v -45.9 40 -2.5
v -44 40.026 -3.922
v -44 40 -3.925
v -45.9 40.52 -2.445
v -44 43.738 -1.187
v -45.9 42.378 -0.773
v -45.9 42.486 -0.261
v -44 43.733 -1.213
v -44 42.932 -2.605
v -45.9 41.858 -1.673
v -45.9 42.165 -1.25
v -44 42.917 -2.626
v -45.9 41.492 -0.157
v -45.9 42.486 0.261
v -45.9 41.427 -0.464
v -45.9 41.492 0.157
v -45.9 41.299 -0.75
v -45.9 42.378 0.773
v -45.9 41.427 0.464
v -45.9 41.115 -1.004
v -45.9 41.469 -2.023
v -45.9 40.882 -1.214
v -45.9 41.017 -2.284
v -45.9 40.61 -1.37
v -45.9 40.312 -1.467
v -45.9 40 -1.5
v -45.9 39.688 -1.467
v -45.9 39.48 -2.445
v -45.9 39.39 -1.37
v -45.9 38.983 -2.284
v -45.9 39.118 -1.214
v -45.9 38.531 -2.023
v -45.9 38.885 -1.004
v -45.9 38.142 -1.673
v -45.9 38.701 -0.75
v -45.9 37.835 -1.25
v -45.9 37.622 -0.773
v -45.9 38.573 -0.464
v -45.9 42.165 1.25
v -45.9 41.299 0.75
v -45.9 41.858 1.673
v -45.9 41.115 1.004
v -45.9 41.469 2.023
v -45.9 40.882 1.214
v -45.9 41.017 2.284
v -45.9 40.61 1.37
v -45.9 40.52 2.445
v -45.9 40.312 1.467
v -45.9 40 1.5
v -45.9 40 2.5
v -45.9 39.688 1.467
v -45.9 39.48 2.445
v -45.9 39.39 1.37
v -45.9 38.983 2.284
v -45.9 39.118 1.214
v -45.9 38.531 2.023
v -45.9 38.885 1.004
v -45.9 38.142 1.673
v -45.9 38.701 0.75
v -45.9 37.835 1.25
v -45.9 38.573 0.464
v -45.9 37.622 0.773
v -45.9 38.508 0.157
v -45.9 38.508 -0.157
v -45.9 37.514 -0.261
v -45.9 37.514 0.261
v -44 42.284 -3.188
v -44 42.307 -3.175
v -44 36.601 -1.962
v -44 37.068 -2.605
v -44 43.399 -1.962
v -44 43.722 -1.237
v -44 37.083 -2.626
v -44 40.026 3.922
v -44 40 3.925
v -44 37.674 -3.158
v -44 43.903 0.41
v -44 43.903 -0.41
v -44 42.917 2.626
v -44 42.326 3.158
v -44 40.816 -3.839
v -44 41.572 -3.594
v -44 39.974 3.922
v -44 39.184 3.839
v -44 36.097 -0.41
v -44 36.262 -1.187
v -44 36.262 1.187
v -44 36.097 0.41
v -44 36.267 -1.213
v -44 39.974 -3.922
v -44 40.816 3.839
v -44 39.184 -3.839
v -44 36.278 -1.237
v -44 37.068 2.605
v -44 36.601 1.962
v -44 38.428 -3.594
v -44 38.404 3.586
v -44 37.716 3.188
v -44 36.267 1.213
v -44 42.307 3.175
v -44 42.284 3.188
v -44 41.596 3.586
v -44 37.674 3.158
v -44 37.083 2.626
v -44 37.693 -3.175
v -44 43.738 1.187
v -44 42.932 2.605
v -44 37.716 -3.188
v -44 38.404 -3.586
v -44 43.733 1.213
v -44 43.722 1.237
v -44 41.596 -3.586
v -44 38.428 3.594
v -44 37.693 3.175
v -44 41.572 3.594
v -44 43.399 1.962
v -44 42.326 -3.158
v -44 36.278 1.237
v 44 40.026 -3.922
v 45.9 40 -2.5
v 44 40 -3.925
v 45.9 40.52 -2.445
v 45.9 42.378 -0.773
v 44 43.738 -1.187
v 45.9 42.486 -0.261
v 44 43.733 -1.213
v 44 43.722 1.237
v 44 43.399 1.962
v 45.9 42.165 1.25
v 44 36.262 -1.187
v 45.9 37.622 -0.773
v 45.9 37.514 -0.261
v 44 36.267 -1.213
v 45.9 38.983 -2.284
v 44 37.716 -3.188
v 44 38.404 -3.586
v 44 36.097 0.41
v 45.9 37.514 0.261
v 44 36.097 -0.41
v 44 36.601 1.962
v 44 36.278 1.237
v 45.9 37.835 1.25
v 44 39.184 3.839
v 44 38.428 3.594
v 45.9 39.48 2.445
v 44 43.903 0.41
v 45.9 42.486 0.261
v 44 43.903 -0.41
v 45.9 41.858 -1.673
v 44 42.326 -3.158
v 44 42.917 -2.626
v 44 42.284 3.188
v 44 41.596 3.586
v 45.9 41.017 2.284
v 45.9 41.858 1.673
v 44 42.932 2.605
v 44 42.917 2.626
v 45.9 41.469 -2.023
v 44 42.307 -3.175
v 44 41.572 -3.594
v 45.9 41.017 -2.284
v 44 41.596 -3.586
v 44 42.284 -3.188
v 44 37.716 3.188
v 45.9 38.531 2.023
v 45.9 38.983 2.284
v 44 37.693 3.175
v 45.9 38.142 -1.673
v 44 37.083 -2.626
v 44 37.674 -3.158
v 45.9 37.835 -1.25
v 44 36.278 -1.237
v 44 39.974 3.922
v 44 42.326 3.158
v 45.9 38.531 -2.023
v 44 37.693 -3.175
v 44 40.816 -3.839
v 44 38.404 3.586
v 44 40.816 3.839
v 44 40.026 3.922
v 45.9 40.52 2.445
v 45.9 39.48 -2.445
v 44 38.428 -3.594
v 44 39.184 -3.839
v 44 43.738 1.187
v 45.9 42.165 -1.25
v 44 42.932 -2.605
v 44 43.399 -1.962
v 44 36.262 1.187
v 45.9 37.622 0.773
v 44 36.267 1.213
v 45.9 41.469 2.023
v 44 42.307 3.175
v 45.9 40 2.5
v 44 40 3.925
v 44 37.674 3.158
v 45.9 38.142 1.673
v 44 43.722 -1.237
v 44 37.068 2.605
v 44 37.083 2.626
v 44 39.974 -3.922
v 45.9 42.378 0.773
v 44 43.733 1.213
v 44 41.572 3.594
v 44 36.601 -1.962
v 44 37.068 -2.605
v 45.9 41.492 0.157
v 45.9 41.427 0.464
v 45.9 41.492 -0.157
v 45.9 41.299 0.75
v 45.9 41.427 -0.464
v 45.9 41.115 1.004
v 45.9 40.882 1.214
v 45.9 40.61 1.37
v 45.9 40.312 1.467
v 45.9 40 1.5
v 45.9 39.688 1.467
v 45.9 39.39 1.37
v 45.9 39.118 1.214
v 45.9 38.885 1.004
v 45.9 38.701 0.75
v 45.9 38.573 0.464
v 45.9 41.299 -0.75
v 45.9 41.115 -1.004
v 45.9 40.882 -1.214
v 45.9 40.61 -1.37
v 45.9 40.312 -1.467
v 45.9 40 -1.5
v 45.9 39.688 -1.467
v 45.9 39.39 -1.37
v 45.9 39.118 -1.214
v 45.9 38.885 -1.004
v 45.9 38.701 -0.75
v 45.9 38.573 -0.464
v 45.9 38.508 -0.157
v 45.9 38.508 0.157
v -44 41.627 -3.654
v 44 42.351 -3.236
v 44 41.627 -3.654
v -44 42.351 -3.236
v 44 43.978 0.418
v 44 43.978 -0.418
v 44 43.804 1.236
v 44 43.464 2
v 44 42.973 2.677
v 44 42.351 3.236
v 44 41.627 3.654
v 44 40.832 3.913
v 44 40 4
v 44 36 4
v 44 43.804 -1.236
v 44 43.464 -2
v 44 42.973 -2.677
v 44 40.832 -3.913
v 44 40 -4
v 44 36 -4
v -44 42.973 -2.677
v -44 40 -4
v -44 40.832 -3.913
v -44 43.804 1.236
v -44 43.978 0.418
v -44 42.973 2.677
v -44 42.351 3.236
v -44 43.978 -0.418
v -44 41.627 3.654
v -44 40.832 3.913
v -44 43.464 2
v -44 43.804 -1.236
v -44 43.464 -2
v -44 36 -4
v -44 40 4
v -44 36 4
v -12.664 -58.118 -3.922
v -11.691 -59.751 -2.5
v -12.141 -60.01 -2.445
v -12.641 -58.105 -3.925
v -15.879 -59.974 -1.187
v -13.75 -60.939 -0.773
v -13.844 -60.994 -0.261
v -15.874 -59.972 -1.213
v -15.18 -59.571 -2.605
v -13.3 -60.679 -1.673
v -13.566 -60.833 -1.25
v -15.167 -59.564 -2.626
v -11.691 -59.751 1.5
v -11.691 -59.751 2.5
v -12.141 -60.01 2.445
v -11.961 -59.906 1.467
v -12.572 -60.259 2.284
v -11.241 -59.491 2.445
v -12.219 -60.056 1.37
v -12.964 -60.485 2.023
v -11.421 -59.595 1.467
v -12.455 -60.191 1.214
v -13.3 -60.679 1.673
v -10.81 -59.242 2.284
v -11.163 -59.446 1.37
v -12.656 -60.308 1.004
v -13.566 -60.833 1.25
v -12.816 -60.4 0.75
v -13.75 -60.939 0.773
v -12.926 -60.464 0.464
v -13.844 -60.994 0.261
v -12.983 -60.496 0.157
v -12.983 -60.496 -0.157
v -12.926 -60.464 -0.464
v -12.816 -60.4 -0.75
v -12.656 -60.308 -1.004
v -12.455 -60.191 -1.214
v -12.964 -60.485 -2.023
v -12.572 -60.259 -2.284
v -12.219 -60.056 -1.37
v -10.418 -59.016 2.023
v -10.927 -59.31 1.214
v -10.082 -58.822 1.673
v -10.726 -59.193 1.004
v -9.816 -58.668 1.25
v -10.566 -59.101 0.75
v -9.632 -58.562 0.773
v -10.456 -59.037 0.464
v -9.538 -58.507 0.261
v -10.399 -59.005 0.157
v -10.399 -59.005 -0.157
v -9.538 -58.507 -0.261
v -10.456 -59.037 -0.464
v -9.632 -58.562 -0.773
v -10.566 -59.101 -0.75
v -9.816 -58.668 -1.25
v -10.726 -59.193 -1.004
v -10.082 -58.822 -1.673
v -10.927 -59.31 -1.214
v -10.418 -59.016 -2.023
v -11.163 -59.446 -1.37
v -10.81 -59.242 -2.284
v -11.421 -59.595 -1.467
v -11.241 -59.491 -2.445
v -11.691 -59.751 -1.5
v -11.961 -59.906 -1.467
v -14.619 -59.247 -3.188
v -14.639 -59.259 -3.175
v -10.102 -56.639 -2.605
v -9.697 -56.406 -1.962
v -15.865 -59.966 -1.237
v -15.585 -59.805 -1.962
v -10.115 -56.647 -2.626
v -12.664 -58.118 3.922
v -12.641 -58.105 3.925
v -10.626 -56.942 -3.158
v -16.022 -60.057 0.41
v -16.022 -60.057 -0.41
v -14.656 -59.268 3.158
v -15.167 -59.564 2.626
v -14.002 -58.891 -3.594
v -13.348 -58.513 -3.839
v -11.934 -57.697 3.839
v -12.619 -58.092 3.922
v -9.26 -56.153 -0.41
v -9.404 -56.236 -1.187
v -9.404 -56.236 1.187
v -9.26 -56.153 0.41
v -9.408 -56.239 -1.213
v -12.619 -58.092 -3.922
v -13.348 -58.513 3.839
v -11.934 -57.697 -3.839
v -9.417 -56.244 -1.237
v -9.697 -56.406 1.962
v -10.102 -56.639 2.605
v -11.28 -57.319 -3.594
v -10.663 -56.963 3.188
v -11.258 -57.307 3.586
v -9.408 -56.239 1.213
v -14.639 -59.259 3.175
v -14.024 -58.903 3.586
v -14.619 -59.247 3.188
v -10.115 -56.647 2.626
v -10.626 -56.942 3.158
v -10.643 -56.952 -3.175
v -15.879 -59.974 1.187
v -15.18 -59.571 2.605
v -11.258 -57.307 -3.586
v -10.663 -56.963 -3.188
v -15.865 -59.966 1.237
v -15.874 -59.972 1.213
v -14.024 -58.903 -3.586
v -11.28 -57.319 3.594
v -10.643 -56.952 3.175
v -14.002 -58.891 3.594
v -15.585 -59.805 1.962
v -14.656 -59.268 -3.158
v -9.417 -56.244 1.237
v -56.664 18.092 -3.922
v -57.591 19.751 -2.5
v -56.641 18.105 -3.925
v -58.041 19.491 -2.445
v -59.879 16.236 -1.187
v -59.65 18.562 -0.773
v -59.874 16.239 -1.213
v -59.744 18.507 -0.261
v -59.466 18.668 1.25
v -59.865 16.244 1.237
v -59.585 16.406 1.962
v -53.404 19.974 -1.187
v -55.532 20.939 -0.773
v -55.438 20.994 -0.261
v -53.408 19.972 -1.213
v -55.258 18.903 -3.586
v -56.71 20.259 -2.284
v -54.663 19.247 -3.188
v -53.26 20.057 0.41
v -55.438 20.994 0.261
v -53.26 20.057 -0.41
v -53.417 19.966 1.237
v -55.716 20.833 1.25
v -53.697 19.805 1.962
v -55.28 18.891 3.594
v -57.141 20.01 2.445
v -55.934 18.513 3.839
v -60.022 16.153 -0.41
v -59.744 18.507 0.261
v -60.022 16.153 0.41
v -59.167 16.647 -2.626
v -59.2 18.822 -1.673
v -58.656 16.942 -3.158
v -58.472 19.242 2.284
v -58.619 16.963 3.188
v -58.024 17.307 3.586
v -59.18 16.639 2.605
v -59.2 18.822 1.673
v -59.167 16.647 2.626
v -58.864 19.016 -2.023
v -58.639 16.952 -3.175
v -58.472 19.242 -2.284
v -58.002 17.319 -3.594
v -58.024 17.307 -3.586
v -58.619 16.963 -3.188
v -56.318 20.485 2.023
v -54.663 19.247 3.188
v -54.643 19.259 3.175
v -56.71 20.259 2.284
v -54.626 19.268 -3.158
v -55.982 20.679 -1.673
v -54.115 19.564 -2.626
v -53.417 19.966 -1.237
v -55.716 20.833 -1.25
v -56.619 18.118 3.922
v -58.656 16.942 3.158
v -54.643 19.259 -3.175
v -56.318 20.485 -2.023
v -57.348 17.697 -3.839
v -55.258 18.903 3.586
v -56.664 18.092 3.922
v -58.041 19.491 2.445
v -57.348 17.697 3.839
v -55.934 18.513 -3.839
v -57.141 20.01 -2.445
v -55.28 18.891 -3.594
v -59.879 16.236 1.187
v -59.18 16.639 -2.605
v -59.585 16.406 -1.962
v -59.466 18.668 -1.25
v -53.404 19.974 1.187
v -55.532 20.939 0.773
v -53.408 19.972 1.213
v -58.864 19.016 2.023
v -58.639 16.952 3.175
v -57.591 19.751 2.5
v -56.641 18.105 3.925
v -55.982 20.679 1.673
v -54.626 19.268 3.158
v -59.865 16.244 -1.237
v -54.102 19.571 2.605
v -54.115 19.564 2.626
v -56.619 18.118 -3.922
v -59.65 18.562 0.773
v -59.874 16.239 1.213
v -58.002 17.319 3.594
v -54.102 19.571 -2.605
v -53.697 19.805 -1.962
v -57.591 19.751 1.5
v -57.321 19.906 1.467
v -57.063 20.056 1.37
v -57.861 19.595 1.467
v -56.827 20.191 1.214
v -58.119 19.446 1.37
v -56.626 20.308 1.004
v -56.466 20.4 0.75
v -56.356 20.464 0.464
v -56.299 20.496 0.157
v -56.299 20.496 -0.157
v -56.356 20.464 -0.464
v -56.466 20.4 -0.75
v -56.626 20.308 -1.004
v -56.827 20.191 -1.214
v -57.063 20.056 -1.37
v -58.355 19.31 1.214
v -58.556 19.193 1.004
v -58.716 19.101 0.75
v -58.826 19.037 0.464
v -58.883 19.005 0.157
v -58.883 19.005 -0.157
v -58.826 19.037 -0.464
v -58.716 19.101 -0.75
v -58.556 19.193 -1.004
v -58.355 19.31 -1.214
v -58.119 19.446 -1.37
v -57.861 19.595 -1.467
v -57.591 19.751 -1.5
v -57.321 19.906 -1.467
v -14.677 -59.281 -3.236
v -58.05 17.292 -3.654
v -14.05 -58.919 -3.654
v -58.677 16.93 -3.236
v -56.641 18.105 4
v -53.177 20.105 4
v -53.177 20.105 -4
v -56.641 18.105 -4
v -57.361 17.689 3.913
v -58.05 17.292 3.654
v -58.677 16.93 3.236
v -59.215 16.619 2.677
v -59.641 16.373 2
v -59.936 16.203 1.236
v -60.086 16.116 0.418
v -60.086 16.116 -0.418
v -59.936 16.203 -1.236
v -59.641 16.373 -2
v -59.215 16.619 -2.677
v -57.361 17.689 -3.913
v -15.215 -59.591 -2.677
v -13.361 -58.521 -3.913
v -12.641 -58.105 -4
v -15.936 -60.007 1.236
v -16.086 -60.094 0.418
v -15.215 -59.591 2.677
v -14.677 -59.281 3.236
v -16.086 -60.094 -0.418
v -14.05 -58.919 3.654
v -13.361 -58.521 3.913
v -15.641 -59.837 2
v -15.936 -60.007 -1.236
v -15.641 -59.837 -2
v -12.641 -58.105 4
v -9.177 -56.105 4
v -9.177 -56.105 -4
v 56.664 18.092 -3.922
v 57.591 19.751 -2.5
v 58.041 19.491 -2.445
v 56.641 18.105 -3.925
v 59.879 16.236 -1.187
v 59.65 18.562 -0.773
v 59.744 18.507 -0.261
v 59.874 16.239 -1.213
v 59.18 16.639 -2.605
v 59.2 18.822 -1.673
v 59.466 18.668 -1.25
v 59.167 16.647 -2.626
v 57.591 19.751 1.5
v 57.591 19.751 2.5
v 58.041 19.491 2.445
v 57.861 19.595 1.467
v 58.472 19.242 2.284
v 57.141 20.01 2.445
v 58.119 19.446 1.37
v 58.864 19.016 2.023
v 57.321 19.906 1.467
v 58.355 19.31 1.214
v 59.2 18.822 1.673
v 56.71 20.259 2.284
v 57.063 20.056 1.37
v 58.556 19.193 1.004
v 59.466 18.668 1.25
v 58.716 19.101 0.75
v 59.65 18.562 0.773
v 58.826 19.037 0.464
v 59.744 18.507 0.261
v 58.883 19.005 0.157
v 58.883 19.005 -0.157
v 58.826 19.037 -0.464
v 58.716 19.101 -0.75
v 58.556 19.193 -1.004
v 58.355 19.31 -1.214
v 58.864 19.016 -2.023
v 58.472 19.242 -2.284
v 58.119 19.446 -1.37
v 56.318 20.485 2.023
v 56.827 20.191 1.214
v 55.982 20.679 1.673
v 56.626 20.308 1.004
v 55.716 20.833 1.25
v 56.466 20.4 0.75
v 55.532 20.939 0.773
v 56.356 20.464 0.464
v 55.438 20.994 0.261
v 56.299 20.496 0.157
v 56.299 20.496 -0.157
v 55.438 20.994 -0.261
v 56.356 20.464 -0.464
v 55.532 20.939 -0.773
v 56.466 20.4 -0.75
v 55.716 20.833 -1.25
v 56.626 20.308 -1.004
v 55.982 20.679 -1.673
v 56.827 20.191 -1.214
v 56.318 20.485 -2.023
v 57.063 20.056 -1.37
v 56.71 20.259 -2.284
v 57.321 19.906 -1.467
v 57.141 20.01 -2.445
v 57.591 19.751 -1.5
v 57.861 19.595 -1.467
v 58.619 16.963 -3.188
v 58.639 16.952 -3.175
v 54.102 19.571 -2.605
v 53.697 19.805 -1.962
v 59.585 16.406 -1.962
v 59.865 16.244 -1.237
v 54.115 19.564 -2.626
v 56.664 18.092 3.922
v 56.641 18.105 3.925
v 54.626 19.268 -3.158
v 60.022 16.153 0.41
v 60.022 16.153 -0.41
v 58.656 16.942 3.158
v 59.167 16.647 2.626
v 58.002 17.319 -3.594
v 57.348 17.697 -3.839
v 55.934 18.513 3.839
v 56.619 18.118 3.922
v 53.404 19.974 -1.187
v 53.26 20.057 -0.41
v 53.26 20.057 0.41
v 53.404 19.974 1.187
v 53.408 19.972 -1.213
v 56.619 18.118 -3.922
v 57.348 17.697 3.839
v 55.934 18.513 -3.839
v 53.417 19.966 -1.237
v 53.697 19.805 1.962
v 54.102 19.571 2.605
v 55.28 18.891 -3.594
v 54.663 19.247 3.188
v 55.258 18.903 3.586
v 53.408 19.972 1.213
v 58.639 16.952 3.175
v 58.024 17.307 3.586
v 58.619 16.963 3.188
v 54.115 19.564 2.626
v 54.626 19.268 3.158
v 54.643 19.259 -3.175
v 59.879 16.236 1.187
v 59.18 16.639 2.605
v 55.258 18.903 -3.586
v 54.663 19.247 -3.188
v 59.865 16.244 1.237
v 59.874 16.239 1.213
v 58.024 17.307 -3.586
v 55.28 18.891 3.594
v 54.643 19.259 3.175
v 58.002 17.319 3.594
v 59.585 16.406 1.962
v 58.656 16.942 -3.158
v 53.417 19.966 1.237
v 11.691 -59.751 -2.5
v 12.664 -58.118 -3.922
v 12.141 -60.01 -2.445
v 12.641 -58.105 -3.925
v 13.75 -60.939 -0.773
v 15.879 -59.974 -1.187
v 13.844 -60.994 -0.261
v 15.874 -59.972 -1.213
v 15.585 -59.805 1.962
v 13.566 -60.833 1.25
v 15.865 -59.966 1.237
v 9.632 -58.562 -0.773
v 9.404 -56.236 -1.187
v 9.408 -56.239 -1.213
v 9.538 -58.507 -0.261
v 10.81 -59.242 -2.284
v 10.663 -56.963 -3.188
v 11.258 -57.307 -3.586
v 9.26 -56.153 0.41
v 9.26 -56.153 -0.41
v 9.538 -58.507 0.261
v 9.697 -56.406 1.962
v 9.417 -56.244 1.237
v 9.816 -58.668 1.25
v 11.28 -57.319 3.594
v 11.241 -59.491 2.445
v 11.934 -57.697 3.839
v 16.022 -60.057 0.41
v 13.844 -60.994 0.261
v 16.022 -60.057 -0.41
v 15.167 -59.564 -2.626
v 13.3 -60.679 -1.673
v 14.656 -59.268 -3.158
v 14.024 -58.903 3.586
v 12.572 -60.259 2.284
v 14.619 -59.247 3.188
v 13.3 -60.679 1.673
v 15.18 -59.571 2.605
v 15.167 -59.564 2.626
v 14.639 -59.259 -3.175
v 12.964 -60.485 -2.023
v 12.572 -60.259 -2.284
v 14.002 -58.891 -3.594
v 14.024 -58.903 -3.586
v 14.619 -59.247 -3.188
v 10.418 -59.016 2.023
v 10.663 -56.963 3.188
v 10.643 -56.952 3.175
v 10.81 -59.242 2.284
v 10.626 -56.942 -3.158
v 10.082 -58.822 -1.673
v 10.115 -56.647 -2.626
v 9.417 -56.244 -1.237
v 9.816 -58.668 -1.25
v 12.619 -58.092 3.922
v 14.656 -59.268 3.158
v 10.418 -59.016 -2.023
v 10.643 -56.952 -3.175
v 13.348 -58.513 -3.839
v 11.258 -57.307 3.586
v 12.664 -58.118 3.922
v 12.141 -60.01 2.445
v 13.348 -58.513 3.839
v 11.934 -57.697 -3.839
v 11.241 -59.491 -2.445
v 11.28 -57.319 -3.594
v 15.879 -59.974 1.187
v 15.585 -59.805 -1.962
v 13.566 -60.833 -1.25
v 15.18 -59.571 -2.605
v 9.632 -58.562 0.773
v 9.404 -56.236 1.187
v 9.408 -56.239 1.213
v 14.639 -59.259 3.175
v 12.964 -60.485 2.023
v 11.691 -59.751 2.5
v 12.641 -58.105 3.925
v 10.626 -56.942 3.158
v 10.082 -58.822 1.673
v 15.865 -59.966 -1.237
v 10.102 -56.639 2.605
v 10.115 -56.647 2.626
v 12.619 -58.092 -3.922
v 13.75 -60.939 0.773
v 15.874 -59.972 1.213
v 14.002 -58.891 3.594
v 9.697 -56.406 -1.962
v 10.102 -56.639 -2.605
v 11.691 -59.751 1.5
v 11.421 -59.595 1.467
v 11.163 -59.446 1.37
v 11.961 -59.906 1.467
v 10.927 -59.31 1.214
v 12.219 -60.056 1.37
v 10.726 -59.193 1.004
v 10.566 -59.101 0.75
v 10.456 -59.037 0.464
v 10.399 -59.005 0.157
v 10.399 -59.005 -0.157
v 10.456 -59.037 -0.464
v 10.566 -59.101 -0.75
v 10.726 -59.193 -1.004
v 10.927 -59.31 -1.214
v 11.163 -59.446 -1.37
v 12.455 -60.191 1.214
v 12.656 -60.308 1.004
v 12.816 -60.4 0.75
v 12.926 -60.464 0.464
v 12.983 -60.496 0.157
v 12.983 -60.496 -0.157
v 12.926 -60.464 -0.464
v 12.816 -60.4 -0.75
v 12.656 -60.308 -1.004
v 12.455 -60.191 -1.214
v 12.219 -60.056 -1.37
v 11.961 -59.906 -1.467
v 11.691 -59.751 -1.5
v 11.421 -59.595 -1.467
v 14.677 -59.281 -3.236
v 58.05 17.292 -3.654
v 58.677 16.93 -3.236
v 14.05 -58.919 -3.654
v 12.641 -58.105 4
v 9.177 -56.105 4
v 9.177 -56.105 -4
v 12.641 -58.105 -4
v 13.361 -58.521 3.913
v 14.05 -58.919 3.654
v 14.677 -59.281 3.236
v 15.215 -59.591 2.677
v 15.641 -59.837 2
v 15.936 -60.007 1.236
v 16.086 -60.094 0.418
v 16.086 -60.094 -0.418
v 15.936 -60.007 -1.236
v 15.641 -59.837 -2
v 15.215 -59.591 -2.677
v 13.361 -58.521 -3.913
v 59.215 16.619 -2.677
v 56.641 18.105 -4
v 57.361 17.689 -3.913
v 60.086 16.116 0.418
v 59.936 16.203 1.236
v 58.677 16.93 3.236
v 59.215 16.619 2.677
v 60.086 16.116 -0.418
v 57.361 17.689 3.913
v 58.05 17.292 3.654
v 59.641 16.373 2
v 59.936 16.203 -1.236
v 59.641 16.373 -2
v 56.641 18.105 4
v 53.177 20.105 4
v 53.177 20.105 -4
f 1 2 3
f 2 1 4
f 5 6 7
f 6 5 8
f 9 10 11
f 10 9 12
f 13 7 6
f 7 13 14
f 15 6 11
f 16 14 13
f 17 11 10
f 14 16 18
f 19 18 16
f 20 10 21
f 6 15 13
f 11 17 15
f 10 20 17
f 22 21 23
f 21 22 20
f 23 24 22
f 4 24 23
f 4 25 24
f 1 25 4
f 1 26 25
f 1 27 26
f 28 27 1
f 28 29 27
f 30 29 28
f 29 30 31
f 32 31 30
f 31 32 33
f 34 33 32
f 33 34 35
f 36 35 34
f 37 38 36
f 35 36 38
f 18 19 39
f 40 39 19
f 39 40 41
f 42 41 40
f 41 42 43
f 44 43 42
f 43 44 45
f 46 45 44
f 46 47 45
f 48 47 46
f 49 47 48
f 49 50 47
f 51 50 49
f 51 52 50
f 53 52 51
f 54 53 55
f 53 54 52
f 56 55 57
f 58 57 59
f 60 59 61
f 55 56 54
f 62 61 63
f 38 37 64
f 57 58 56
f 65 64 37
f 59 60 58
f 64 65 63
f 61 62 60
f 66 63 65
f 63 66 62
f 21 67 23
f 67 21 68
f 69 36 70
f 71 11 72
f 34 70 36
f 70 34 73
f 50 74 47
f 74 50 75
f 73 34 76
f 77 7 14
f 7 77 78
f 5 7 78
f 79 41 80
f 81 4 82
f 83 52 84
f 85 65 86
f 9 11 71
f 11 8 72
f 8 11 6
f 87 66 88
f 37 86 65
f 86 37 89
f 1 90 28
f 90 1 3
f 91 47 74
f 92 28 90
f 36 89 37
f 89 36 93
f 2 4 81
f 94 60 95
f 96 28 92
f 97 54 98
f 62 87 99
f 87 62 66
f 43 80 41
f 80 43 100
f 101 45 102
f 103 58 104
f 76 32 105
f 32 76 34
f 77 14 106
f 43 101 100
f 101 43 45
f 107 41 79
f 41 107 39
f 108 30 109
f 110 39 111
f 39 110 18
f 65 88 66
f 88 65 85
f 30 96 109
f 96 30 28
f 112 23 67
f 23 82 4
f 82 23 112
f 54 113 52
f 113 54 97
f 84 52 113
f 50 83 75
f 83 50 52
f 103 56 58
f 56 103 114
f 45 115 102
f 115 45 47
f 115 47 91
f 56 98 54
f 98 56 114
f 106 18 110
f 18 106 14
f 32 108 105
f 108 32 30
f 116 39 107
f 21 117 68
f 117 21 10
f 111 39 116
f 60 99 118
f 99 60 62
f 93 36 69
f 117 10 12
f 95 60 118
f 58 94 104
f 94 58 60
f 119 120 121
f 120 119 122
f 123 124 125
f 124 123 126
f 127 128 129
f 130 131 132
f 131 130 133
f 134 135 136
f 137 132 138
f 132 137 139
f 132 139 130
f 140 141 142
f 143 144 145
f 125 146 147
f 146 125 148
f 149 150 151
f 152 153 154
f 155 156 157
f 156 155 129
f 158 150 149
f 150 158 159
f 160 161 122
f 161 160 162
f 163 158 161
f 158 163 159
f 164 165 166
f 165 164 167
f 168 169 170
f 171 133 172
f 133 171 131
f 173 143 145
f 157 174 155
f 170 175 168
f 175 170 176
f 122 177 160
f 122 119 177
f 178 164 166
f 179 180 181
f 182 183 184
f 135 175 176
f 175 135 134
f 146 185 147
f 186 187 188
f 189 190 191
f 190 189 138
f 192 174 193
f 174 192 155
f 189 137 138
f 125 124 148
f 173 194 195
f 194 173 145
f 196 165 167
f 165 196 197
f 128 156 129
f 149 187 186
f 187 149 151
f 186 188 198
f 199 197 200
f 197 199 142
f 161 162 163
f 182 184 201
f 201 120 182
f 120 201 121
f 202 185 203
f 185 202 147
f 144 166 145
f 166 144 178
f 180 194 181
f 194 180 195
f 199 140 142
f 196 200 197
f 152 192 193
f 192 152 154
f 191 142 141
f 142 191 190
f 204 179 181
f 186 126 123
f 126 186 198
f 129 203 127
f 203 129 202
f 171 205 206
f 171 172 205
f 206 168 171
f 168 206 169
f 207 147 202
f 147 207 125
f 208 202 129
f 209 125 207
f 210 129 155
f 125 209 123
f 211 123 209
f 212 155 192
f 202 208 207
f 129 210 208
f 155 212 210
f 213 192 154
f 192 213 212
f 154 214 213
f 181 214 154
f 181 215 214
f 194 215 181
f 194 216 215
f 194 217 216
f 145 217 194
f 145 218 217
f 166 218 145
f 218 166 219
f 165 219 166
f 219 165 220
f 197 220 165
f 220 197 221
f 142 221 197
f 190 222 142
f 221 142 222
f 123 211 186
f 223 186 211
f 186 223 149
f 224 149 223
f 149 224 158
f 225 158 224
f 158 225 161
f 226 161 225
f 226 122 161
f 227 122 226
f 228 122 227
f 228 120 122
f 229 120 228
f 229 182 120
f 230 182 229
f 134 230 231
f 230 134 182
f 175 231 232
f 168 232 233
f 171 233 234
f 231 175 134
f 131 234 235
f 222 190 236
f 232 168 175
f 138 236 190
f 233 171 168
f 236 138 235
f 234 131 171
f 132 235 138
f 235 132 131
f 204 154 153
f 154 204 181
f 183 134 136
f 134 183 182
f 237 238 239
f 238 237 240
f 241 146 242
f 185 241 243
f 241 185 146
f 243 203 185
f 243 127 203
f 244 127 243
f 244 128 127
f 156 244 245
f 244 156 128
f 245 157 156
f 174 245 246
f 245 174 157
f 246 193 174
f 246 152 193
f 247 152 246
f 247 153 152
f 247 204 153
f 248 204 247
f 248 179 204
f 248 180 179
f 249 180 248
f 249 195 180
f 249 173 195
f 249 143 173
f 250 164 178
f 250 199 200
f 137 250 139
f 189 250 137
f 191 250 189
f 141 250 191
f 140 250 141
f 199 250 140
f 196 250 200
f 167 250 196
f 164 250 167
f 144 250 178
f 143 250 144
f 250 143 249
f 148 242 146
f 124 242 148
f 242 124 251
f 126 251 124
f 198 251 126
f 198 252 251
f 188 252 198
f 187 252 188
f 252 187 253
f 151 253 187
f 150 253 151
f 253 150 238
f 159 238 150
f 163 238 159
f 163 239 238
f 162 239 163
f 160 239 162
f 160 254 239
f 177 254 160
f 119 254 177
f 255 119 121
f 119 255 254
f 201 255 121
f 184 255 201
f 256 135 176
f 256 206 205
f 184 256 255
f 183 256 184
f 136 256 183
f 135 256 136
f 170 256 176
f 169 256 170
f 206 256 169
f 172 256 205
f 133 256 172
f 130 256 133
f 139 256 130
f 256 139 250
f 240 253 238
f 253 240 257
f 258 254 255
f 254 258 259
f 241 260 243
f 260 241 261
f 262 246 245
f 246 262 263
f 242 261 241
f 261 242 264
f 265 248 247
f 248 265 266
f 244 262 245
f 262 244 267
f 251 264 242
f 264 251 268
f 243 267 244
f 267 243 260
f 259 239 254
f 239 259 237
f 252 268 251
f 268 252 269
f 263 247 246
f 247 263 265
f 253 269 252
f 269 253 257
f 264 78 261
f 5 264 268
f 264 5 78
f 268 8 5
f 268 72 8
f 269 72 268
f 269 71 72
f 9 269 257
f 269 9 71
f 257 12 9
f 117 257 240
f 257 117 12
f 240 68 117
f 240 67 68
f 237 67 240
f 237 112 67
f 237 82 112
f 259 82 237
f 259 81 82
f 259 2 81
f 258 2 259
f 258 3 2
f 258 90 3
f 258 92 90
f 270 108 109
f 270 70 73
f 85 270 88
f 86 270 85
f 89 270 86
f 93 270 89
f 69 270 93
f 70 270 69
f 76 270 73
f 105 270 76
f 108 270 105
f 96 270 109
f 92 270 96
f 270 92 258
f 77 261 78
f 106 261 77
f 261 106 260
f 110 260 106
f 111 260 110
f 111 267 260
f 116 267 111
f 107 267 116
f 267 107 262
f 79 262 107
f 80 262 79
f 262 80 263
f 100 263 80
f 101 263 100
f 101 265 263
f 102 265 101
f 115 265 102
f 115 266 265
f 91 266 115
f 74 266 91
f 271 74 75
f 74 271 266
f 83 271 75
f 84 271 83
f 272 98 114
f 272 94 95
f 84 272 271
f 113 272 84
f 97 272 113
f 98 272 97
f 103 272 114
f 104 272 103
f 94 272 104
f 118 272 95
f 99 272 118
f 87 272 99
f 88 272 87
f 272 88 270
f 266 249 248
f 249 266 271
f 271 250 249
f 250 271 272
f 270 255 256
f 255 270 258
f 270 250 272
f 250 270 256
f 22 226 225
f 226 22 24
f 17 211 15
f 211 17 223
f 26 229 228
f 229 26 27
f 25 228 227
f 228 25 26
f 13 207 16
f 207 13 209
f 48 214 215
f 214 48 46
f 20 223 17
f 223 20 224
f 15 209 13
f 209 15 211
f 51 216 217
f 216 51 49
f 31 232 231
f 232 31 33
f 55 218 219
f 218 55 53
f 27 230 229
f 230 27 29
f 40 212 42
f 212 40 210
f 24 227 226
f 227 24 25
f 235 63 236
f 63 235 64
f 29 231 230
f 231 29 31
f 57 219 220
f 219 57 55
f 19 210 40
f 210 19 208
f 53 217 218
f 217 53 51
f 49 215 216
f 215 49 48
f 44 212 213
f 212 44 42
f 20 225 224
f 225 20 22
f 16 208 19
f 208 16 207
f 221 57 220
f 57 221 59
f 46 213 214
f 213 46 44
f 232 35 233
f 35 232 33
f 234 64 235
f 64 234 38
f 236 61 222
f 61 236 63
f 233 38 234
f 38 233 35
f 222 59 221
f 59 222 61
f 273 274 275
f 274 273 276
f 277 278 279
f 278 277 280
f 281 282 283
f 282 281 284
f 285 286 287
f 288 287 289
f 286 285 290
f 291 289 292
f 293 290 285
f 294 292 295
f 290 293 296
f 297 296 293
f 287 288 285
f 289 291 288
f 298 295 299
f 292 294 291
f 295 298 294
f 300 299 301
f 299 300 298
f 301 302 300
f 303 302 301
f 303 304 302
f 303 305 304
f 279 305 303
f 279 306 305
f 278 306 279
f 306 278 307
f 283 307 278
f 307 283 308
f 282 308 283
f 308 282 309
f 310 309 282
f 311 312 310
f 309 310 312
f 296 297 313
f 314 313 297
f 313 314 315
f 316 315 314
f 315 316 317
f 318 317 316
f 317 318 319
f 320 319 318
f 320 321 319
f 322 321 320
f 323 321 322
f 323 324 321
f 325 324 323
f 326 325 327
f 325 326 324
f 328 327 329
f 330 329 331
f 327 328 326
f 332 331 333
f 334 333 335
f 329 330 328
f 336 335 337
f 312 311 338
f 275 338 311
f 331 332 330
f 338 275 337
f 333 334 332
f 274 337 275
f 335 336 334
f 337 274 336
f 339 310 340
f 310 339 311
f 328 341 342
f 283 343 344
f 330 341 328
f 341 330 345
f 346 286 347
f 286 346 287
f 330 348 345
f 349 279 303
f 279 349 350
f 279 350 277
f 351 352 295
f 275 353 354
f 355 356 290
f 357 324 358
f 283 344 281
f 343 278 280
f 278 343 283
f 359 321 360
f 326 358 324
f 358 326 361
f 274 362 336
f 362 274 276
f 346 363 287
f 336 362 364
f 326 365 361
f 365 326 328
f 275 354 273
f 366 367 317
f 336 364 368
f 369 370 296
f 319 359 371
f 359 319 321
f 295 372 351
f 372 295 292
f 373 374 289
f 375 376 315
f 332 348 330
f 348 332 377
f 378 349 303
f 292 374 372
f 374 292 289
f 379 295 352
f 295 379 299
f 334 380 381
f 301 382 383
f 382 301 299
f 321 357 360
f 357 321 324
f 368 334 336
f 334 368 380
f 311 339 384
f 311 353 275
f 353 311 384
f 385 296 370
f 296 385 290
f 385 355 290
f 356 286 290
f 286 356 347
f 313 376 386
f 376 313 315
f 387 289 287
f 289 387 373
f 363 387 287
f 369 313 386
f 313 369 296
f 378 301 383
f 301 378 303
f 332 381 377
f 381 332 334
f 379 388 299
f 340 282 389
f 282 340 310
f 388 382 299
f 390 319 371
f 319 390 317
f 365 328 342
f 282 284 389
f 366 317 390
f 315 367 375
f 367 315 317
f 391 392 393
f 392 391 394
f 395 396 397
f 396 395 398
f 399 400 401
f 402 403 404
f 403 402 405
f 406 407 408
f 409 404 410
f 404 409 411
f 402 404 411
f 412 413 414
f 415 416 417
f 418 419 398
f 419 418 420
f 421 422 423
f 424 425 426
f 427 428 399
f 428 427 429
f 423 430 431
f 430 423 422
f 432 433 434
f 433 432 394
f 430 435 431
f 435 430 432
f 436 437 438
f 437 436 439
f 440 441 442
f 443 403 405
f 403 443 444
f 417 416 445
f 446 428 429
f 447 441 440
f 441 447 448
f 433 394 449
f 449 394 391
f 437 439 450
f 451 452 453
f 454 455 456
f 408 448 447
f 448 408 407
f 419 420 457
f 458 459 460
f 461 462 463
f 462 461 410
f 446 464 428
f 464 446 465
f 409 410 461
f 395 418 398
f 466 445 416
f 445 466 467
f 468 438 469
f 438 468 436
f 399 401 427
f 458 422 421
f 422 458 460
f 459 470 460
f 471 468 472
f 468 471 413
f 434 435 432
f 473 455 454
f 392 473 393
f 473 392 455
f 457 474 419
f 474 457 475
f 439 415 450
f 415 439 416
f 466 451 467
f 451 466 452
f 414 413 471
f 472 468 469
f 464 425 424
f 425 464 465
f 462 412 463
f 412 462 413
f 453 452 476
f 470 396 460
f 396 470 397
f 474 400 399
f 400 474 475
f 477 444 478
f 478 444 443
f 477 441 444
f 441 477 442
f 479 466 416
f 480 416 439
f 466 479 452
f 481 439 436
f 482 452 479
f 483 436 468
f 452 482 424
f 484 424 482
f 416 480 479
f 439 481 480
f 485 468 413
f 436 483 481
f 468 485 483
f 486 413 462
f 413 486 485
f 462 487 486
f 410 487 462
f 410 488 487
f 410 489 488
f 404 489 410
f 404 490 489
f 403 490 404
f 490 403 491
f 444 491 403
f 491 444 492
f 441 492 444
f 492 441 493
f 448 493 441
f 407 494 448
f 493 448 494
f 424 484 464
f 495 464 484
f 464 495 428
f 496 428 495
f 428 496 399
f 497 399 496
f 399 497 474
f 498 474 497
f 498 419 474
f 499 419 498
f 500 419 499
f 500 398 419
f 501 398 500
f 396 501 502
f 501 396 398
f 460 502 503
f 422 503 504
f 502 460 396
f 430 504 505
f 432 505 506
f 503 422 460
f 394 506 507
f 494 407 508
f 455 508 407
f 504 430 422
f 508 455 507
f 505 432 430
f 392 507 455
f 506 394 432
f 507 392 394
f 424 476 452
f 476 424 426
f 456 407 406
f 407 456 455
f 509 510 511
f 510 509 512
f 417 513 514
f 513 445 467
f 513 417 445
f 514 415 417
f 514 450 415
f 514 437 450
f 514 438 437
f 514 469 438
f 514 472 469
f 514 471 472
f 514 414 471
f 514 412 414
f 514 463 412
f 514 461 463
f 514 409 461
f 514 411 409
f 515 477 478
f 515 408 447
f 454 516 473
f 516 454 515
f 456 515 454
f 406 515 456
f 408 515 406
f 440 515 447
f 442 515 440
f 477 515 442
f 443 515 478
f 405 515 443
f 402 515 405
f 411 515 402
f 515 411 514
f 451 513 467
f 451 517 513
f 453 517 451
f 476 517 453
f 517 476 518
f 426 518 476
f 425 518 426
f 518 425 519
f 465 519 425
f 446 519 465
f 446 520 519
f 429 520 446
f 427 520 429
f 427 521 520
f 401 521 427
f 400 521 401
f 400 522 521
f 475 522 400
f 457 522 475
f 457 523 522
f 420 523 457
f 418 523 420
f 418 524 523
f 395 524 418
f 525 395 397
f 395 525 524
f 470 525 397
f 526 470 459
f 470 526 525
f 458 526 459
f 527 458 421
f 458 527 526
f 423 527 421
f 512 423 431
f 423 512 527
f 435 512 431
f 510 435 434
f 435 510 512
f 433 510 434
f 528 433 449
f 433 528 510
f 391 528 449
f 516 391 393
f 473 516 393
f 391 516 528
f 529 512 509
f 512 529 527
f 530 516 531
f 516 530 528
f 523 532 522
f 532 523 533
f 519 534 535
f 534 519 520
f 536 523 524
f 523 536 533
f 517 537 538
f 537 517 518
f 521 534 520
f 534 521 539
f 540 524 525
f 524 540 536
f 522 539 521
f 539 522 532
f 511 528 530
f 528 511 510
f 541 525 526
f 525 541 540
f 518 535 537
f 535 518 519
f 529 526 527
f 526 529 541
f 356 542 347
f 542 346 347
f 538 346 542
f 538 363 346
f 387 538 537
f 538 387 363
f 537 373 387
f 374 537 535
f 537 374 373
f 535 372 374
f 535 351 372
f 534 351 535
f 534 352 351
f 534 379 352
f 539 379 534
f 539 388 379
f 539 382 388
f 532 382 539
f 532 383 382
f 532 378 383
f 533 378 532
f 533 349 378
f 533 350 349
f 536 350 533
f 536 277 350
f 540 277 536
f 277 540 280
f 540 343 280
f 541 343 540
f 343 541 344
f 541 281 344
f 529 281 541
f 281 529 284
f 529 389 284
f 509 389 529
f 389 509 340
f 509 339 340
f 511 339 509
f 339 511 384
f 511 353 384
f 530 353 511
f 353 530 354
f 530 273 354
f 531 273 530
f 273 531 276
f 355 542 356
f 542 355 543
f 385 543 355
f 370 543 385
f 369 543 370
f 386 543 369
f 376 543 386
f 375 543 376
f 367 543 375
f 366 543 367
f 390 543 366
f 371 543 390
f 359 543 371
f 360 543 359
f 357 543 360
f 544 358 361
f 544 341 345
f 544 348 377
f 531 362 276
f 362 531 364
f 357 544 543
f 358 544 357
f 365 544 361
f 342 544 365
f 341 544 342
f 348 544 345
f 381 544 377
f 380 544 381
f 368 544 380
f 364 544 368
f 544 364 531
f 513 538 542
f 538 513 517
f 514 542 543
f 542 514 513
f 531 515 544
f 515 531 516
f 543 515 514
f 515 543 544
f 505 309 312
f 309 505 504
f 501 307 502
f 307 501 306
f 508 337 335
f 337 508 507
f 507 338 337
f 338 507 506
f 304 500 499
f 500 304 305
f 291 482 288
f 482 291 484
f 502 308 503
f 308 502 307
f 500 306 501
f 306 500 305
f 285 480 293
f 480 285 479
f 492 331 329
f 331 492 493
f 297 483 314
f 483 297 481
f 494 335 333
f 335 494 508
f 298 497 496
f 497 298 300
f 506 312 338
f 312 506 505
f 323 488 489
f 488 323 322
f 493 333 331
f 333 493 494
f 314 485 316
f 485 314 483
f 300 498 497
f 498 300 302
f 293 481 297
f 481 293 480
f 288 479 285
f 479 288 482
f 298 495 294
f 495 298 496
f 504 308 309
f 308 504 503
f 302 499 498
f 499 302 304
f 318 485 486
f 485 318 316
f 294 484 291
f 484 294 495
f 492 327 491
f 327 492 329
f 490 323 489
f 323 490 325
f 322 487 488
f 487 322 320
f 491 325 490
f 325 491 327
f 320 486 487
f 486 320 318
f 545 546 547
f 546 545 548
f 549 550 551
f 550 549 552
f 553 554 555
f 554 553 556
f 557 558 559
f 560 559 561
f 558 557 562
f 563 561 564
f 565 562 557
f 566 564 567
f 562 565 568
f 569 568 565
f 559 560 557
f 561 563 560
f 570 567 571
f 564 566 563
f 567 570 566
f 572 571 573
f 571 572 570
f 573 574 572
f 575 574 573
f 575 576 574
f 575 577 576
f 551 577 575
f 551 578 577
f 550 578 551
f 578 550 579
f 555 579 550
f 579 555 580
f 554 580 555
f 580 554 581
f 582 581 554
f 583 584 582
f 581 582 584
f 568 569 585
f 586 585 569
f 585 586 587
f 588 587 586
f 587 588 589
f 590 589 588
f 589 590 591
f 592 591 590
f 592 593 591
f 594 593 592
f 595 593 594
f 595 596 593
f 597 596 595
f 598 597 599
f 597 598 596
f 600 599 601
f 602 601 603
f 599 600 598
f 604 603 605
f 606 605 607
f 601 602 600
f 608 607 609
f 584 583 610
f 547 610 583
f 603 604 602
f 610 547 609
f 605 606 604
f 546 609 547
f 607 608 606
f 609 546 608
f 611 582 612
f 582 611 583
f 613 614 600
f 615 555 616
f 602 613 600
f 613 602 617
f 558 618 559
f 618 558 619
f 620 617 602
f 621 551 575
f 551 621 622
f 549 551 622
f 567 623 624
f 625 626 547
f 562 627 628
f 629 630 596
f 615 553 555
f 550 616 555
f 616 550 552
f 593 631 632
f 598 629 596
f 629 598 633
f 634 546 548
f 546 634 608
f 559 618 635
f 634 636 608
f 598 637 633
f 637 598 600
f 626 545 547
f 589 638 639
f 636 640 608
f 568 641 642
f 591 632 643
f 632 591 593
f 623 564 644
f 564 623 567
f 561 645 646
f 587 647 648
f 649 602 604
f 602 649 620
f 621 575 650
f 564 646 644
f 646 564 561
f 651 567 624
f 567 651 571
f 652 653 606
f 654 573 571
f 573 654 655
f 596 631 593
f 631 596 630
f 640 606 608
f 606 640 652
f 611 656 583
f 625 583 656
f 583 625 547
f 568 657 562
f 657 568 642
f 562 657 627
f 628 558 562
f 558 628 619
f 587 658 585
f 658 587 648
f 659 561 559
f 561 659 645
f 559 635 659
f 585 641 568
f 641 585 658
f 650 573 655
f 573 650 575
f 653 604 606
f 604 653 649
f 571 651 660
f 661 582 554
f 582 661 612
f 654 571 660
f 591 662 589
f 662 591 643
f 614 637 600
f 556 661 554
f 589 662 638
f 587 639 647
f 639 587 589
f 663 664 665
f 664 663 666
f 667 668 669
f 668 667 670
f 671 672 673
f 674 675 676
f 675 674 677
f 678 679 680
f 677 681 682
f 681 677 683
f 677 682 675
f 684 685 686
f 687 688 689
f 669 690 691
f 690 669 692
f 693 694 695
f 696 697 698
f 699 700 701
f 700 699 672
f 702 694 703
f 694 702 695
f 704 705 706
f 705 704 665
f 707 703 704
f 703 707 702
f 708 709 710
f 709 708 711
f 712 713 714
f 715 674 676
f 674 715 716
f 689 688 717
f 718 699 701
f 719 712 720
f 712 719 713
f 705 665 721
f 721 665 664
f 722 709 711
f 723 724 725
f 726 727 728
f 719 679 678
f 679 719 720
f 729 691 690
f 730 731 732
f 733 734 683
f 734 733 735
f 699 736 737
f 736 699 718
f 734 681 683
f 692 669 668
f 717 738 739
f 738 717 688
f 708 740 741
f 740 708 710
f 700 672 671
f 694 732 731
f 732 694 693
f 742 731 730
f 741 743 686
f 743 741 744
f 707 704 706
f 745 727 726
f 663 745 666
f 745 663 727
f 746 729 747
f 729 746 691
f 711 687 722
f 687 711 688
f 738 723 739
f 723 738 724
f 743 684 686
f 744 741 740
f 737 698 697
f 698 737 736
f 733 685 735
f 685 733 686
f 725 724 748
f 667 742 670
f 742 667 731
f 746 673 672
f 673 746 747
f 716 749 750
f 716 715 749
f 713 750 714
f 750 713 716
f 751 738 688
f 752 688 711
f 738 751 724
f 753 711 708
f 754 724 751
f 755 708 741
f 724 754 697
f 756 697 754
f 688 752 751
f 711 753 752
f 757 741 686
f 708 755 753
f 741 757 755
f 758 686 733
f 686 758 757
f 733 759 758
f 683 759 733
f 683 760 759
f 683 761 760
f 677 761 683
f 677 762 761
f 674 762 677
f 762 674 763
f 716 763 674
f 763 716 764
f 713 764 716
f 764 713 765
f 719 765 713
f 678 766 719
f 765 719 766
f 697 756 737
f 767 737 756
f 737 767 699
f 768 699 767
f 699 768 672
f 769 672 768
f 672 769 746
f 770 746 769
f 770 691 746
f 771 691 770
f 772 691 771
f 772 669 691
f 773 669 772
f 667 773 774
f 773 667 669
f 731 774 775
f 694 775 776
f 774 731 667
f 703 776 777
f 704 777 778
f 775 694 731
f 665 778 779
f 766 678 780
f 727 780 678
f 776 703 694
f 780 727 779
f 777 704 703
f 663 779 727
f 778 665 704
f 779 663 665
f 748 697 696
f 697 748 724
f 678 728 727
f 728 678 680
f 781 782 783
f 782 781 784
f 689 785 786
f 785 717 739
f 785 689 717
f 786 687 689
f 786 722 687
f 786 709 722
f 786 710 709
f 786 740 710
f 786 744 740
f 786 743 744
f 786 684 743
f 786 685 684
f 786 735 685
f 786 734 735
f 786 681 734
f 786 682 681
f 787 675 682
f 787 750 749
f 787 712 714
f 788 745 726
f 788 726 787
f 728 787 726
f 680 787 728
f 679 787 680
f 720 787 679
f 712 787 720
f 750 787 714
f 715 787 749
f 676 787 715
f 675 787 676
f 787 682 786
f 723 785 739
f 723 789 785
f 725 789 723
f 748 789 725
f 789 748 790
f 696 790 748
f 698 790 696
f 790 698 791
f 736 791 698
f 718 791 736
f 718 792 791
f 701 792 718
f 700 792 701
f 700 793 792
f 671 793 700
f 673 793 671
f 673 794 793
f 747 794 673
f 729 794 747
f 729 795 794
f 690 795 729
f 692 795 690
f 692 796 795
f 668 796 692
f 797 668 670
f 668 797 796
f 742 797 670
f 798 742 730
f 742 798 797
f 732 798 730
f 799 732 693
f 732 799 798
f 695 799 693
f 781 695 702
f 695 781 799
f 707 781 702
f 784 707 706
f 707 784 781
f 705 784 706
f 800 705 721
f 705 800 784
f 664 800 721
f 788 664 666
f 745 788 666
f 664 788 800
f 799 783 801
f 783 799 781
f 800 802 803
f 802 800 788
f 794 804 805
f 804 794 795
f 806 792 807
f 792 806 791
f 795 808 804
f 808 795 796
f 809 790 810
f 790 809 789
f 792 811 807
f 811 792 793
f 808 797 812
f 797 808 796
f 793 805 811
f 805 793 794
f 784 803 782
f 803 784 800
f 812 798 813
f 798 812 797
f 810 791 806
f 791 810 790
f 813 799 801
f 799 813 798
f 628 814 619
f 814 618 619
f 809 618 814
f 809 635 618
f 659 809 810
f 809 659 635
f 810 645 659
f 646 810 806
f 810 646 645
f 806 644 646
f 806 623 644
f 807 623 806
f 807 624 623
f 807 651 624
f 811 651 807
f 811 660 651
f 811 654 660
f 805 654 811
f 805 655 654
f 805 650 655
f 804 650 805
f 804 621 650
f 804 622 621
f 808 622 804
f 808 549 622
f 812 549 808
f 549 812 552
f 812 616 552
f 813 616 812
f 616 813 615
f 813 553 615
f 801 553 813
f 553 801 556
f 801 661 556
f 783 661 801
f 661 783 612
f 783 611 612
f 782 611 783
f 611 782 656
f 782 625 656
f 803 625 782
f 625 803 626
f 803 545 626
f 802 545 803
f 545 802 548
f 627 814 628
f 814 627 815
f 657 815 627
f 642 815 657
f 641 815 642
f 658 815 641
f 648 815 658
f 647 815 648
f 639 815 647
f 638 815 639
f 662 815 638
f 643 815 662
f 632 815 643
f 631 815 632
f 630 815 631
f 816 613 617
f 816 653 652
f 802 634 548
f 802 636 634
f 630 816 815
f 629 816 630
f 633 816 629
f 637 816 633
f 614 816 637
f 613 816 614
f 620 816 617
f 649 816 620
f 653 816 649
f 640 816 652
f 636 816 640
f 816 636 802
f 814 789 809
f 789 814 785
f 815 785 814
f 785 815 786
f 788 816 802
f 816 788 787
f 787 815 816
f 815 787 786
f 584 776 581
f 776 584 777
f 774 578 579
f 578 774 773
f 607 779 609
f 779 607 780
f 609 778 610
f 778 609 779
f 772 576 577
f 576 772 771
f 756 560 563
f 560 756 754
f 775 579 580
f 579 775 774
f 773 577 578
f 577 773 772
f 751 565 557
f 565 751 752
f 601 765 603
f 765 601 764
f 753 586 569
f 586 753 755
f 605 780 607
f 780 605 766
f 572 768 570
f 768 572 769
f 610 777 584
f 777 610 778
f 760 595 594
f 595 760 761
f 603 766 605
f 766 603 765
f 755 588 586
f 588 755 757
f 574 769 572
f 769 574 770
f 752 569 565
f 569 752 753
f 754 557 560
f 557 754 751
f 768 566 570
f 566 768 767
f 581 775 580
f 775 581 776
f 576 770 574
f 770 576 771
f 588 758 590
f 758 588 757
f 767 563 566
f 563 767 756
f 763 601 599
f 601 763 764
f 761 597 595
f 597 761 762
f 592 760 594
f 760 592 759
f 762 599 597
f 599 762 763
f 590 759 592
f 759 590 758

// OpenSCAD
// file: ujoint.scad
use <MCAD/metric_fastners.scad>;

bearing_height=2.5;
bearing_od=6;
bearing_id=3;

//bearing_height=4;
//bearing_od=10;
bearing_id=3;


module mr63zz() {
    $fs=0.1;
    
    difference() {
        cylinder(d=6, h=2.5, center=true);
        cylinder(d=3, h=5, center=true);
        
        
        for (side=[-1,1]) {
            translate([0,0,side * (2.5-0.2)])
            difference() {
                cylinder(d=6-0.5, h=2.5, center=true);
                cylinder(d=3+0.5, h=5, center=true);
            }
        }
    }
}


$fs=0.1;

module joint_assembly(zangle=0, xangle=0, rod_spacing = 60) {
    xoffset = 8;
    for (side=[-1,1]) {
        translate([side*rod_spacing/2,0,0]) {
            
            // x bearing
            translate([side*xoffset,0,0])
            rotate([0,90,0])
            mr63zz();

            rotate([xangle, 0, 0]) {
                // z bearing
                mr63zz();   

                // rod_holder
                holder_cut_length = 12;
                holder_width = 10;
                holder_rod_clamp_length=20;
                
                rotate([0,0,zangle]) {
                    for (rod_holder_side=[0,1]) {
                        mirror([0,0,rod_holder_side])
                        difference() {
                            translate([0,0,7]) {
                                hull() {
                                    translate([0,-holder_cut_length/2,0])
                                    cube([holder_width, holder_cut_length, 2], true);
                                    
                                    cylinder(d=holder_width, h=2, center=true);
                                }
                                mirror([0,0,1])
                                cylinder(d=4.5, h=8-2);
                            }
                            
                            // shaft hole
                            cylinder(d=3, h=1000, center=true);                
                        }
                    }
                
                    difference() {
                        translate([0,-holder_cut_length-holder_rod_clamp_length/2,0])
                        cube([holder_width, holder_rod_clamp_length, 16], true);
                        
                        // rod hole
                        rotate([90,0,0])
                        cylinder(d=8, h=1000);
                        
                    }
                    // bolt
                    translate([0,0,6.2])
                    rotate([180,0,0])
                    cap_bolt(3, 15);
                }
                
            }
        }
    }


    // center bar
    rotate([xangle, 0, 0])
    difference() {
        cube([rod_spacing+xoffset*2-bearing_height, 10, 5], true);
        
        for (side=[-1,1]) {
            translate([side*rod_spacing/2,0,0]) {
                cylinder(d=6, h=100, center=true);
            }    
        }
    }

    // fixing
    for (side=[-1,1]) {
        translate([side*(rod_spacing/2+xoffset),0,0]) {
            rotate([0,90,0])
            difference() {
                hull() {
                    cylinder(d=bearing_od+2, h=bearing_height, center=true);
                    translate([0,5,0])
                    cube([bearing_od+2, 12, bearing_height], true);
                }
                cylinder(d=bearing_od, h=1000, center=true);
            }
            
        }
    }
    
    translate([0,12,0])
    cube([rod_spacing+xoffset*2+bearing_height, 2, bearing_od+2], true);
}


module joint_corss_shaft(holder_width) {
    difference() {
        union() {
            rotate([0,90,0])
            cylinder(d=bearing_od+2, h=holder_width, center=true);    

            cylinder(d=bearing_id+1, h=bearing_od+2+0.5, center=true);            
            
            cylinder(d=bearing_id, h=bearing_od+2+bearing_height*2+2, center=true);
        }
        
        translate([holder_width/2-bearing_height/2,0,0])
        rotate([0,90,0])
        cylinder(d=bearing_od, h=bearing_height+1, center=true);    

        translate([-holder_width/2+bearing_height/2,0,0])
        rotate([0,-90,0])
        cylinder(d=bearing_od, h=bearing_height+1, center=true);    
        
        rotate([0,90,0])
        cylinder(d=bearing_id+1, h=1000, center=true);
    }    
}


module joint_rod_coupler() {
    cutout_length=6+bearing_od;
    for (i=[0,1]) 
        mirror([0,0,i]) {
            translate([0,0,bearing_od/2+1+0.5+bearing_height/2]) {
                difference() {
                    union() {
                        cylinder(d=bearing_od+2, h=bearing_height, center=true);
                        
                        translate([0,cutout_length/2,0])
                        cube([bearing_od+2, cutout_length, bearing_height], center=true);
                        
                    }
                    cylinder(d=bearing_od, h=bearing_height*2, center=true);
                }
            }
        }
            
    // rod clamp
    rod_clamp_length=5+10;
    difference() {
        translate([0,cutout_length+rod_clamp_length/2,0])
        cube([bearing_od+2, rod_clamp_length, bearing_od+2+1+bearing_height*2], true);
        
        // fixing bolt hole
        translate([0,cutout_length+3,0])
        cylinder(d=3, h=1000, center=true);
        
        // rod hole
        translate([0,cutout_length+5,0])
        rotate([-90,0,0])
        cylinder(d=8.5, h=1000);
    }    
}

module joint_mount(rod_spacing, holder_width=bearing_od+2, clearance=0) {
    difference() {
        union() {
            rotate([0,90,0])
            cylinder(d=bearing_od+2, h=rod_spacing-holder_width-4, center=true);
                
            mount_len = bearing_od/2+1+clearance;
            translate([0,-mount_len/2,0])
            cube([rod_spacing-holder_width-4, mount_len, bearing_od+2], true);
            
            for (side=[0,1])
                mirror([side,0,0])
                translate([-rod_spacing/2+holder_width/2+0.1,0,0])
                rotate([0,90,0])
                cylinder(d1=bearing_id+2, d2=bearing_od+2,h=2);
        }

        rotate([0,90,0])
        cylinder(d=bearing_id, h=1000, center=true);
    }
    
}

module joint_assembly2(zangle=0, xangle=0, rod_spacing = 60) {
    holder_width = bearing_od+2;
    
    
    for (side=[-1,1]) {
        translate([side*rod_spacing/2,0,0])
        rotate([xangle,0,0]) {
            joint_corss_shaft(holder_width);
     
            rotate([0,0,zangle])
            joint_rod_coupler();
        }
    }
    
    
    // fixing to body
    joint_mount(rod_spacing, holder_width);
}

phase = $t<0.5 ? $t*2 : 2-$t*2;
xangle = 0;//phase*90;
zangle = 35;
joint_assembly2(zangle, xangle);
// main file
use <ujoint.scad>;

module effector(rod_spacing, effector_radius) {
    for (i=[0:2]) {
        rotate([0,0,i*120])
        translate([0,effector_radius,0])
        joint_mount(rod_spacing);
    }
}


effector(100, 40);
